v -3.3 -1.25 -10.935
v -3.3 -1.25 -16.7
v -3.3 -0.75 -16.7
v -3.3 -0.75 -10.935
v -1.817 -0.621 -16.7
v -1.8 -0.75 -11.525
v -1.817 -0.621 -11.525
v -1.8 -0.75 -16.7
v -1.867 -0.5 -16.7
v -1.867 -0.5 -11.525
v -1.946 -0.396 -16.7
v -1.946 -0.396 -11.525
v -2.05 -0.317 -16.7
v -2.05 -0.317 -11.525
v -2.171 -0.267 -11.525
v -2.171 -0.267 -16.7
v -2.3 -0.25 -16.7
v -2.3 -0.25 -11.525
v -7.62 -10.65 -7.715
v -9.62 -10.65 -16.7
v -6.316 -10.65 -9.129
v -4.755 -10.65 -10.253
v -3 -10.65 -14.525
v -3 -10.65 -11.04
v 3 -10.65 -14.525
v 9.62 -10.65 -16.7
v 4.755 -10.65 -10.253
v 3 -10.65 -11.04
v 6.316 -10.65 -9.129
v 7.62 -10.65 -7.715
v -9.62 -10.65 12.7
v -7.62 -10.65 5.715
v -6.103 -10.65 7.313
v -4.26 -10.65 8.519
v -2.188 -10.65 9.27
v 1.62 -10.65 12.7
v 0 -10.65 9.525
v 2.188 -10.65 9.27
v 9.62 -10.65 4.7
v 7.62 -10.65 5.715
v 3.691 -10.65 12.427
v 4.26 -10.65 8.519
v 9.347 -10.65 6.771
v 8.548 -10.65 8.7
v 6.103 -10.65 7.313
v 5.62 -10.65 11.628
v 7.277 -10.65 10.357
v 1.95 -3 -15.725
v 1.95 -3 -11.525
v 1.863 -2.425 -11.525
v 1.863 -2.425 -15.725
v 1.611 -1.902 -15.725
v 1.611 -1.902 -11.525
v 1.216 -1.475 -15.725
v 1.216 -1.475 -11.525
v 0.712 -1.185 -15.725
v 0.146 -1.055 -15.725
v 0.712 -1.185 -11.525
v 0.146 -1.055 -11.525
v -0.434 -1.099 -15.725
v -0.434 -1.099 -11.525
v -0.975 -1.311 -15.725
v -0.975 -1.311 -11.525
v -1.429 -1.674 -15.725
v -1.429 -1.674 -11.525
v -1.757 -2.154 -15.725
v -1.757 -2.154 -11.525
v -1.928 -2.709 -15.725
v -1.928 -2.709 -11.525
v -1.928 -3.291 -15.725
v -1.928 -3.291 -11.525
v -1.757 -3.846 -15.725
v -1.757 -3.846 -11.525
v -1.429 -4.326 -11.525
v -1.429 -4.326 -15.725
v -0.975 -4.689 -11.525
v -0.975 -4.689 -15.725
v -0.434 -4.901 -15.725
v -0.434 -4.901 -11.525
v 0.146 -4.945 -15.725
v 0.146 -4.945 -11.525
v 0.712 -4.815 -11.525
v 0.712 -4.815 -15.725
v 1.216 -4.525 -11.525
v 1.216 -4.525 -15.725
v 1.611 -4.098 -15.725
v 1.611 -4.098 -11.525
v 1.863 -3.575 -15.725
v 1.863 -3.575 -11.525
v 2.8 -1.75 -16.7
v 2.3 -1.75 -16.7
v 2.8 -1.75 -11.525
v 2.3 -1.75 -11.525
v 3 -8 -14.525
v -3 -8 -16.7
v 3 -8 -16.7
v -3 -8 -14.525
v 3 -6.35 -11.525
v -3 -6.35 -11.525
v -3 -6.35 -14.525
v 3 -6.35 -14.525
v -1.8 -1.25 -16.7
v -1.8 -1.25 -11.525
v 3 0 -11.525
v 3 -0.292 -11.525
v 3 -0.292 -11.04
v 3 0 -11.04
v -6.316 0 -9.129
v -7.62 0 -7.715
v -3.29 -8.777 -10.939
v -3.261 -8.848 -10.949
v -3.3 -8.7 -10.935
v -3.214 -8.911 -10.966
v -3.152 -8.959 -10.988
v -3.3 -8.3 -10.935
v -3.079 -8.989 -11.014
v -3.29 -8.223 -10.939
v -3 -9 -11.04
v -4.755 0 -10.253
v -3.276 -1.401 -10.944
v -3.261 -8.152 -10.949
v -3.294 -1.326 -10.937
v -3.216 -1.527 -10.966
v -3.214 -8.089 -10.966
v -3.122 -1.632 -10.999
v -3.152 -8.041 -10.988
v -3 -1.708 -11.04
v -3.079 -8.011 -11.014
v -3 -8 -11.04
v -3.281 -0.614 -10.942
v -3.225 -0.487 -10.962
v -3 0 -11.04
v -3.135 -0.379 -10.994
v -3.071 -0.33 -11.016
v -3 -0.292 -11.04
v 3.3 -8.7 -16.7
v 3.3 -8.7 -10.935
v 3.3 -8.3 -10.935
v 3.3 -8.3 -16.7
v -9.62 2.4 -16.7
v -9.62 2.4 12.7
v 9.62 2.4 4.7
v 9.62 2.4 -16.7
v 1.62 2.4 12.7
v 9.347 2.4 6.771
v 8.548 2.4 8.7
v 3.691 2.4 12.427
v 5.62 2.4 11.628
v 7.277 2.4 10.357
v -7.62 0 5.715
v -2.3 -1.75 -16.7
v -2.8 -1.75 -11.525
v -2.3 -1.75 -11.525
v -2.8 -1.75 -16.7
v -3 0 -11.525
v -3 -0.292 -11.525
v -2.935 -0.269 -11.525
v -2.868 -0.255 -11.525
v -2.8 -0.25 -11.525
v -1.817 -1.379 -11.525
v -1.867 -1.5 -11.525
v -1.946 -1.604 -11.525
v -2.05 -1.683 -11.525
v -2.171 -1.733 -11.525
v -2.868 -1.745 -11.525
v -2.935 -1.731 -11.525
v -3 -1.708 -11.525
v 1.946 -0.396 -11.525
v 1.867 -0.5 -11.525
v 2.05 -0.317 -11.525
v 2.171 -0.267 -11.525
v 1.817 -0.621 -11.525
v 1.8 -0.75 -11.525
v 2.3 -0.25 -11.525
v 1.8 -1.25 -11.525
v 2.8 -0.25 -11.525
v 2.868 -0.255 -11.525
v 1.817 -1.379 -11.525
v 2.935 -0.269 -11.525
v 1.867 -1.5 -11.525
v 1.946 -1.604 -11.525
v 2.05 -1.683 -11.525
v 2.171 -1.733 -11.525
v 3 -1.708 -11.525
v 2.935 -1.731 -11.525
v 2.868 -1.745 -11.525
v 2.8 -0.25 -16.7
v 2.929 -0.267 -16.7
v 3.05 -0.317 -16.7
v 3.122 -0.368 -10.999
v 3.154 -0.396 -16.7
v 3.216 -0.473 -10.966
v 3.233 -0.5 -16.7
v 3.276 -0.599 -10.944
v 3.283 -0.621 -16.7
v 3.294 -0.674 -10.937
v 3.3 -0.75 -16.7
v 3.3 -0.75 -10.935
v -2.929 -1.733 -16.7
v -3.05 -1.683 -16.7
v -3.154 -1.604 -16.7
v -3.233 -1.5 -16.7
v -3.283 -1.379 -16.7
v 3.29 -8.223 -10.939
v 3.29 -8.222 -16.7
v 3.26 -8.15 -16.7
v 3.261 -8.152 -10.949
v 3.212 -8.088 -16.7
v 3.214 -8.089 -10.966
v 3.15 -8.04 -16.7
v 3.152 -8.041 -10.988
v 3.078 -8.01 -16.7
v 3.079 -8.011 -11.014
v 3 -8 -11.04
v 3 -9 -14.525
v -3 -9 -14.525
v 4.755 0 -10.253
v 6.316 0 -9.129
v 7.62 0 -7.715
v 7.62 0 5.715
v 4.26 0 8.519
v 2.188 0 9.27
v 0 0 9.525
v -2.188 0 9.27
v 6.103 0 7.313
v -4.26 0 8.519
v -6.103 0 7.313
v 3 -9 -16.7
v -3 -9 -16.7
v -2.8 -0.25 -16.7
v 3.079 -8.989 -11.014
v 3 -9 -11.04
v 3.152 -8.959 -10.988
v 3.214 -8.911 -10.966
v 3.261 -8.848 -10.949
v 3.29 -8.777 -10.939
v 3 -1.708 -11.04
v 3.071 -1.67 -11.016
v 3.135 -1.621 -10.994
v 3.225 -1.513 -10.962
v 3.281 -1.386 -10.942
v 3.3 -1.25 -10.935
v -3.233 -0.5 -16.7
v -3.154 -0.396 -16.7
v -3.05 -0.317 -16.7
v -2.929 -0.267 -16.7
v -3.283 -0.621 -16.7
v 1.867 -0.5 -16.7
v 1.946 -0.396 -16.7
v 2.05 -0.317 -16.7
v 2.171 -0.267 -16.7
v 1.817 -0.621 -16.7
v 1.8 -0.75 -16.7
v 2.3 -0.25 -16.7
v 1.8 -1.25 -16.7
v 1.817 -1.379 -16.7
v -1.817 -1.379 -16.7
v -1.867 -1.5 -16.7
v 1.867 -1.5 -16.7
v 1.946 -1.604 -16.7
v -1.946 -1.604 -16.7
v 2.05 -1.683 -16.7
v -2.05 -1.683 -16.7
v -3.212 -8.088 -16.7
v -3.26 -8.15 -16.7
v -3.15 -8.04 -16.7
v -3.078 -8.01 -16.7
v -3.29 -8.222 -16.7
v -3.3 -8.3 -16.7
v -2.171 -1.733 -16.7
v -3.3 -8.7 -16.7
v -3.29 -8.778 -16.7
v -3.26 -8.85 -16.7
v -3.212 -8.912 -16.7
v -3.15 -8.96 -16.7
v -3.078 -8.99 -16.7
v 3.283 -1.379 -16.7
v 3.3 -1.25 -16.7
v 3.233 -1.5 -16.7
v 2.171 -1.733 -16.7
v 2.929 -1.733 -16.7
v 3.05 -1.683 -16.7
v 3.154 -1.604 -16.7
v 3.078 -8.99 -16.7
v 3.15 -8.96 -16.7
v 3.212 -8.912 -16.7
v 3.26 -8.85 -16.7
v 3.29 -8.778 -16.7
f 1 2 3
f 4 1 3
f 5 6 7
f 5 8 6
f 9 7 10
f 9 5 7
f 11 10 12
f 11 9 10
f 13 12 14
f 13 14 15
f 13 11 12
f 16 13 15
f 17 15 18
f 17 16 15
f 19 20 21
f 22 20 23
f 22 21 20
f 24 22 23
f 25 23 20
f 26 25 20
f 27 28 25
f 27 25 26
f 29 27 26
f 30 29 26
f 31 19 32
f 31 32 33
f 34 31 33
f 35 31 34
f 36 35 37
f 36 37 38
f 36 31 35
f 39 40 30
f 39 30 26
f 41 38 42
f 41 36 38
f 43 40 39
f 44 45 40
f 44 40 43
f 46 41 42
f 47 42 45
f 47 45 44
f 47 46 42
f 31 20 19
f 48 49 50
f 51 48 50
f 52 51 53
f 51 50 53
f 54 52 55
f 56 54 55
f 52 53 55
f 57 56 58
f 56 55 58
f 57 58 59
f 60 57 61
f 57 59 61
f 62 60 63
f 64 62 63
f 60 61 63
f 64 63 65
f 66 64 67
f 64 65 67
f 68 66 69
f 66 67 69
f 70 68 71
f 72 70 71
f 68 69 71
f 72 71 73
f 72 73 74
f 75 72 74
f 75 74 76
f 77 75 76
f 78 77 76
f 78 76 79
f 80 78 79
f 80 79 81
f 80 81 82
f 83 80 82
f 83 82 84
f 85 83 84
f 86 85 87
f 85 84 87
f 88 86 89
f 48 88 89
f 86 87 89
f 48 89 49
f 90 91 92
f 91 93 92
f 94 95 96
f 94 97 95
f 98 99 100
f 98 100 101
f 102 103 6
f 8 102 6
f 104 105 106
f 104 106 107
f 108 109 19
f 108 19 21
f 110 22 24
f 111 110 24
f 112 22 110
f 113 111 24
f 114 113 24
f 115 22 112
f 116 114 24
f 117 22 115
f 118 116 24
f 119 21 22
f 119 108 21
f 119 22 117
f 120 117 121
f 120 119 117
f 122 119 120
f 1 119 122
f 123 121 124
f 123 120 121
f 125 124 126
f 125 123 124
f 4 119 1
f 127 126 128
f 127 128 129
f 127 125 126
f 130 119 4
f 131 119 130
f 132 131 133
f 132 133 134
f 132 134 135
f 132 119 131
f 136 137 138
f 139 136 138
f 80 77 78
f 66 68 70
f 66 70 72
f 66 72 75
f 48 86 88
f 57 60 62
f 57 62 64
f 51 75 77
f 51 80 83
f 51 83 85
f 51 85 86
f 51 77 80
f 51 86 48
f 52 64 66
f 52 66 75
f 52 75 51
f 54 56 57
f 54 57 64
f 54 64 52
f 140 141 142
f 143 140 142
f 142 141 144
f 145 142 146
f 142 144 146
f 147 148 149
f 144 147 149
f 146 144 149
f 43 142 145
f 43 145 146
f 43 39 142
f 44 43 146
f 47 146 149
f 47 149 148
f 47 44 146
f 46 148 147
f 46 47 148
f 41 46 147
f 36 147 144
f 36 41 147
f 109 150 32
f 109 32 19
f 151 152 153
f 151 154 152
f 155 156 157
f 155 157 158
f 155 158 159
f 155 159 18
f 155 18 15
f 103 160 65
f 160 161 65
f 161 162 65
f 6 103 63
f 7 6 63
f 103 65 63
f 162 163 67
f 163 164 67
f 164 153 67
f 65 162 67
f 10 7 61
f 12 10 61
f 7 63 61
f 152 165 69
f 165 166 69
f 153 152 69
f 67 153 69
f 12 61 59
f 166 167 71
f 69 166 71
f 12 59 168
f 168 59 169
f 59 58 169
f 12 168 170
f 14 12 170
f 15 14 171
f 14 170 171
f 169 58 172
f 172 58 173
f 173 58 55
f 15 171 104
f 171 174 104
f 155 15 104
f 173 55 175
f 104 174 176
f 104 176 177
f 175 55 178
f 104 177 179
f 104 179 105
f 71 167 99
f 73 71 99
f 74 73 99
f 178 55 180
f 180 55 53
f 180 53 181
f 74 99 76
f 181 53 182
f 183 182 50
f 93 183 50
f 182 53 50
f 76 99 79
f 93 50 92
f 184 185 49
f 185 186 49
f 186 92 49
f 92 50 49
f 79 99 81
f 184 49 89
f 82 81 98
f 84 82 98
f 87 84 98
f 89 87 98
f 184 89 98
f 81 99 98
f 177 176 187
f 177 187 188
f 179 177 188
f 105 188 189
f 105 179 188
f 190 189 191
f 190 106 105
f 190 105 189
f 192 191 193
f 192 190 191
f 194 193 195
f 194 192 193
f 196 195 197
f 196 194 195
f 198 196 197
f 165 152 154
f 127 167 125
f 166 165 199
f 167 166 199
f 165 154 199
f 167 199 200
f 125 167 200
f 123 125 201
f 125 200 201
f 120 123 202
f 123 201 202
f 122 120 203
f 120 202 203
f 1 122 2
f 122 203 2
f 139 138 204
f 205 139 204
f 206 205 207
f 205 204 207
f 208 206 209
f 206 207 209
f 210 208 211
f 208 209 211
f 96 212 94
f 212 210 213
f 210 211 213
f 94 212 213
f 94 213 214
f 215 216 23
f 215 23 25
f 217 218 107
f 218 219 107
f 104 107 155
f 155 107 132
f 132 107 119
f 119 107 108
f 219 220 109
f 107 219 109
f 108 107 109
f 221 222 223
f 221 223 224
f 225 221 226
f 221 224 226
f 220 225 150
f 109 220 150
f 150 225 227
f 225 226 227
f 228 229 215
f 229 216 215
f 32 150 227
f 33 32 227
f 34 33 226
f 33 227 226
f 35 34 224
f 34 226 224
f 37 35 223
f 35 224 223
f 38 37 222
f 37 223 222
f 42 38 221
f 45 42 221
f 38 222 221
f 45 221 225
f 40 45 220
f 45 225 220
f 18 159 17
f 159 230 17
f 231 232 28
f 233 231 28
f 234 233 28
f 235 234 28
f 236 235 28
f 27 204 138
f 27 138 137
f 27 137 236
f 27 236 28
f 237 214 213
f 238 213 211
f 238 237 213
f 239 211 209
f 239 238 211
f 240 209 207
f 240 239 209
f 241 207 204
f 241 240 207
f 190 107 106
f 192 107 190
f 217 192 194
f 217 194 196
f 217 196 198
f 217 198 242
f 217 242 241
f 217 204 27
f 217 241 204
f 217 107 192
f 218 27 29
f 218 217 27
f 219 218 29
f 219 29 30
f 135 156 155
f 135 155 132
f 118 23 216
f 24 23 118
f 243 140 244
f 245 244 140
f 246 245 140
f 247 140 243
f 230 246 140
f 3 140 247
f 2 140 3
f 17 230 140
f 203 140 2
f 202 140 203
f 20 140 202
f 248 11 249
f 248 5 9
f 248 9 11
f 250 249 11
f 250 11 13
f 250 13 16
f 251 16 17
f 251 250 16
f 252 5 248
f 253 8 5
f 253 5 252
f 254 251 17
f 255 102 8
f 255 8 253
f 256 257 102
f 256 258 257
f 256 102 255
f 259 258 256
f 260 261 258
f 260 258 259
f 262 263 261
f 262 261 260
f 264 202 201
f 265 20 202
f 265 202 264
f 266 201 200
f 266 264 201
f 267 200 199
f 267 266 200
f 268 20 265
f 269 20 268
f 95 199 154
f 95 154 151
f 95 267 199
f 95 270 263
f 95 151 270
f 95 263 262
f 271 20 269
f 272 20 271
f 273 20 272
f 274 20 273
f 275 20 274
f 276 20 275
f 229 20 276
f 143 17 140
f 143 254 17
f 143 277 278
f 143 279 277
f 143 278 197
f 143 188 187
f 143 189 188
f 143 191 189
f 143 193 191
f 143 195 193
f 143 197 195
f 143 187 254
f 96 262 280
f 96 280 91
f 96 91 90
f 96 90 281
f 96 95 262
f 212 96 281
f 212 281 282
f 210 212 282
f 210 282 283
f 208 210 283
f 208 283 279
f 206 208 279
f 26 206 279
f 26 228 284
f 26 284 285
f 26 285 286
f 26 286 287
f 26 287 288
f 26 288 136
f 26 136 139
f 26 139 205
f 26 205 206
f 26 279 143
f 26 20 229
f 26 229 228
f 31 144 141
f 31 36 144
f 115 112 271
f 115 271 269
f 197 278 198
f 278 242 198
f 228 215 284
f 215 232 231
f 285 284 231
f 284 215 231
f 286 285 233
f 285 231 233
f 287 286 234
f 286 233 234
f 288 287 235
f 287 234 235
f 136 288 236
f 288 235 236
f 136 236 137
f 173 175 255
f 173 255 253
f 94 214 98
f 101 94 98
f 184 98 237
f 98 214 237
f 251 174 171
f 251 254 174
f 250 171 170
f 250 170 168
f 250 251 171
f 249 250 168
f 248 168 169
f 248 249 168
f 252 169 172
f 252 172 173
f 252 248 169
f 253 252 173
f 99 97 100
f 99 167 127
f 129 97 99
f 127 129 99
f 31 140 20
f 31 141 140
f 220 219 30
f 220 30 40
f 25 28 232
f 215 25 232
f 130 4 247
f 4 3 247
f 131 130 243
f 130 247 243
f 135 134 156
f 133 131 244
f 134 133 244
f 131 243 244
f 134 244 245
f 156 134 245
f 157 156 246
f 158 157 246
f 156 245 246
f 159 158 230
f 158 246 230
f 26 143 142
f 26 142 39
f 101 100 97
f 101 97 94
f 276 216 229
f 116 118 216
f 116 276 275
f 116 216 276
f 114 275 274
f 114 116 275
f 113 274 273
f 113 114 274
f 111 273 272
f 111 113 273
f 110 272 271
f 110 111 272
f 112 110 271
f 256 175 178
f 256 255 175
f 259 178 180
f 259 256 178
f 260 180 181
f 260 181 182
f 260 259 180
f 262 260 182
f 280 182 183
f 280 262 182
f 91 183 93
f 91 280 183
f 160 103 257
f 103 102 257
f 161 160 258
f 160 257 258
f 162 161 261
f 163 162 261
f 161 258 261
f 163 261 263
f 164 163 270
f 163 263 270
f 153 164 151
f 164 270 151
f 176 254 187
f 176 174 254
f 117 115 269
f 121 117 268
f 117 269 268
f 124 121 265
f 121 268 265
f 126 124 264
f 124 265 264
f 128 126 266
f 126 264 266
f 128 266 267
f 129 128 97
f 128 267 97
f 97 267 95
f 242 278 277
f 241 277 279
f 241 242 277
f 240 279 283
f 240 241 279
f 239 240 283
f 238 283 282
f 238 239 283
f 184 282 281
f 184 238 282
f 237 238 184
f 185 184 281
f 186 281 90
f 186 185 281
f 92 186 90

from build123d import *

# Parameters (mm, degrees)
F2_DEPTH       = 10.6500000106
F4_W           = 19.24
F4_H           = 27.4
F5_DEPTH       = 2.4
F6_W           = 6
F6_H           = 0.6600641444
F7_DEPTH       = 10.6500000106
F8_W           = 19.24
F8_H           = 13.0500000106
F9_DEPTH       = 2
F10_R          = 1.95
F11_DEPTH      = 4.2
F12_W          = 6
F12_H          = 4.3
F13_DEPTH      = 3
F14_R          = 8
F15_W          = 6.6
F15_H          = 1
F16_DEPTH      = 8
F16_DEPTH_BACK = 8
F17_R          = 0.3
F18_W          = 1.5
F18_H          = 1.5
F19_DEPTH      = 5.175
F19_DEPTH_BACK = 1
F20_R          = 0.5


with BuildPart() as f2:
    # F1 (on Front) → F2 (new body)
    with BuildSketch(Plane.XZ):
        Polygon((9.62, -1), (9.62, 12.7), (7.62, 12.7), (7.62, 5.715), (7.62, 4.7), (7.62, -1), align=None)
        with BuildLine():
            Line((7.62, 5.715), (7.62, 12.7))
            Line((7.62, 12.7), (-7.62, 12.7))
            Line((-7.62, 12.7), (-7.62, 5.715))
            ThreePointArc((-7.62, 5.715), (0, 9.525), (7.62, 5.715))
        make_face()
        Polygon((-7.62, 5.715), (-7.62, 12.7), (-9.62, 12.7), (-9.62, -1), (-7.62, -1), (-7.62, 4.7), align=None)
    extrude(amount=F2_DEPTH)

    # F3: F2 across face


with BuildPart() as f2_1:
    add(f2.part)
    add(f2.part.mirror(Plane(origin=(-8.62, -5.3250000053, -1), x_dir=(1, 0, 0), z_dir=(0, 0, -1))))

    # F4 (on face) → F5 (join)
    with BuildSketch(Plane(origin=(0, 0, 0), x_dir=(-1, 0, 0), z_dir=(0, 1, 0))):
        with Locations((0, -1)):
            Rectangle(F4_W, F4_H)
    extrude(amount=F5_DEPTH)

    # F6 (on face) → F7 (cut, through all)
    with BuildSketch(Plane.XZ.offset(10.6500000106)):
        with Locations((0, -11.1949679278)):
            Rectangle(F6_W, F6_H)
    extrude(amount=-F7_DEPTH, mode=Mode.SUBTRACT)

    # F8 (on face) → F9 (join)
    with BuildSketch(Plane(origin=(0, 0, -14.7), x_dir=(1, 0, 0), z_dir=(0, 0, -1))):
        with Locations((0, 4.1250000053)):
            Rectangle(F8_W, F8_H)
    extrude(amount=F9_DEPTH)

    # F10 (on face) → F11 (cut)
    with BuildSketch(Plane.XY.offset(-11.525)):
        with Locations((0, -3)):
            Circle(F10_R)
    extrude(amount=-F11_DEPTH, mode=Mode.SUBTRACT)

    # F12 (on face) → F13 (cut)
    with BuildSketch(Plane.XY.offset(-11.525)):
        with Locations((0, -8.5000000106)):
            Rectangle(F12_W, F12_H)
    extrude(amount=-F13_DEPTH, mode=Mode.SUBTRACT)

    # F14
    f14_edges = [f2_1.edges().sort_by_distance(p)[0] for p in [
        (9.62, -4.125, 12.7),
    ]]
    fillet(f14_edges, radius=F14_R)

    # F15 (on face) → F16 (cut, two sides)
    with BuildSketch(Plane.XY.offset(-14.525)) as f16_sk:
        with Locations((0, -8.5000000106)):
            Rectangle(F15_W, F15_H)
    extrude(amount=-F16_DEPTH, mode=Mode.SUBTRACT)
    extrude(f16_sk.sketch, amount=F16_DEPTH_BACK, mode=Mode.SUBTRACT)

    # F17
    f17_edges = [f2_1.edges().sort_by_distance(p)[0] for p in [
        (3.3, -8, -13.817539),
        (-3.3, -8, -13.817539),
        (-3.3, -9, -13.817539),
        (3.3, -9, -13.817539),
    ]]
    fillet(f17_edges, radius=F17_R)

    # F18 (on face) → F19 (cut, two sides)
    with BuildSketch(Plane.XY.offset(-11.525)) as f19_sk:
        with Locations((2.55, -1)):
            Rectangle(F18_W, F18_H)
        with Locations((-2.55, -1)):
            Rectangle(F18_W, F18_H)
    extrude(amount=-F19_DEPTH, mode=Mode.SUBTRACT)
    extrude(f19_sk.sketch, amount=F19_DEPTH_BACK, mode=Mode.SUBTRACT)

    # F20
    f20_edges = [f2_1.edges().sort_by_distance(p)[0] for p in [
        (3.3, -0.25, -13.817539),
        (3.3, -1.75, -13.817539),
        (1.8, -1.75, -14.1125),
        (1.8, -0.25, -14.1125),
        (-3.3, -0.25, -13.817539),
        (-1.8, -0.25, -14.1125),
        (-1.8, -1.75, -14.1125),
        (-3.3, -1.75, -13.817539),
    ]]
    fillet(f20_edges, radius=F20_R)


solid = f2_1.part
